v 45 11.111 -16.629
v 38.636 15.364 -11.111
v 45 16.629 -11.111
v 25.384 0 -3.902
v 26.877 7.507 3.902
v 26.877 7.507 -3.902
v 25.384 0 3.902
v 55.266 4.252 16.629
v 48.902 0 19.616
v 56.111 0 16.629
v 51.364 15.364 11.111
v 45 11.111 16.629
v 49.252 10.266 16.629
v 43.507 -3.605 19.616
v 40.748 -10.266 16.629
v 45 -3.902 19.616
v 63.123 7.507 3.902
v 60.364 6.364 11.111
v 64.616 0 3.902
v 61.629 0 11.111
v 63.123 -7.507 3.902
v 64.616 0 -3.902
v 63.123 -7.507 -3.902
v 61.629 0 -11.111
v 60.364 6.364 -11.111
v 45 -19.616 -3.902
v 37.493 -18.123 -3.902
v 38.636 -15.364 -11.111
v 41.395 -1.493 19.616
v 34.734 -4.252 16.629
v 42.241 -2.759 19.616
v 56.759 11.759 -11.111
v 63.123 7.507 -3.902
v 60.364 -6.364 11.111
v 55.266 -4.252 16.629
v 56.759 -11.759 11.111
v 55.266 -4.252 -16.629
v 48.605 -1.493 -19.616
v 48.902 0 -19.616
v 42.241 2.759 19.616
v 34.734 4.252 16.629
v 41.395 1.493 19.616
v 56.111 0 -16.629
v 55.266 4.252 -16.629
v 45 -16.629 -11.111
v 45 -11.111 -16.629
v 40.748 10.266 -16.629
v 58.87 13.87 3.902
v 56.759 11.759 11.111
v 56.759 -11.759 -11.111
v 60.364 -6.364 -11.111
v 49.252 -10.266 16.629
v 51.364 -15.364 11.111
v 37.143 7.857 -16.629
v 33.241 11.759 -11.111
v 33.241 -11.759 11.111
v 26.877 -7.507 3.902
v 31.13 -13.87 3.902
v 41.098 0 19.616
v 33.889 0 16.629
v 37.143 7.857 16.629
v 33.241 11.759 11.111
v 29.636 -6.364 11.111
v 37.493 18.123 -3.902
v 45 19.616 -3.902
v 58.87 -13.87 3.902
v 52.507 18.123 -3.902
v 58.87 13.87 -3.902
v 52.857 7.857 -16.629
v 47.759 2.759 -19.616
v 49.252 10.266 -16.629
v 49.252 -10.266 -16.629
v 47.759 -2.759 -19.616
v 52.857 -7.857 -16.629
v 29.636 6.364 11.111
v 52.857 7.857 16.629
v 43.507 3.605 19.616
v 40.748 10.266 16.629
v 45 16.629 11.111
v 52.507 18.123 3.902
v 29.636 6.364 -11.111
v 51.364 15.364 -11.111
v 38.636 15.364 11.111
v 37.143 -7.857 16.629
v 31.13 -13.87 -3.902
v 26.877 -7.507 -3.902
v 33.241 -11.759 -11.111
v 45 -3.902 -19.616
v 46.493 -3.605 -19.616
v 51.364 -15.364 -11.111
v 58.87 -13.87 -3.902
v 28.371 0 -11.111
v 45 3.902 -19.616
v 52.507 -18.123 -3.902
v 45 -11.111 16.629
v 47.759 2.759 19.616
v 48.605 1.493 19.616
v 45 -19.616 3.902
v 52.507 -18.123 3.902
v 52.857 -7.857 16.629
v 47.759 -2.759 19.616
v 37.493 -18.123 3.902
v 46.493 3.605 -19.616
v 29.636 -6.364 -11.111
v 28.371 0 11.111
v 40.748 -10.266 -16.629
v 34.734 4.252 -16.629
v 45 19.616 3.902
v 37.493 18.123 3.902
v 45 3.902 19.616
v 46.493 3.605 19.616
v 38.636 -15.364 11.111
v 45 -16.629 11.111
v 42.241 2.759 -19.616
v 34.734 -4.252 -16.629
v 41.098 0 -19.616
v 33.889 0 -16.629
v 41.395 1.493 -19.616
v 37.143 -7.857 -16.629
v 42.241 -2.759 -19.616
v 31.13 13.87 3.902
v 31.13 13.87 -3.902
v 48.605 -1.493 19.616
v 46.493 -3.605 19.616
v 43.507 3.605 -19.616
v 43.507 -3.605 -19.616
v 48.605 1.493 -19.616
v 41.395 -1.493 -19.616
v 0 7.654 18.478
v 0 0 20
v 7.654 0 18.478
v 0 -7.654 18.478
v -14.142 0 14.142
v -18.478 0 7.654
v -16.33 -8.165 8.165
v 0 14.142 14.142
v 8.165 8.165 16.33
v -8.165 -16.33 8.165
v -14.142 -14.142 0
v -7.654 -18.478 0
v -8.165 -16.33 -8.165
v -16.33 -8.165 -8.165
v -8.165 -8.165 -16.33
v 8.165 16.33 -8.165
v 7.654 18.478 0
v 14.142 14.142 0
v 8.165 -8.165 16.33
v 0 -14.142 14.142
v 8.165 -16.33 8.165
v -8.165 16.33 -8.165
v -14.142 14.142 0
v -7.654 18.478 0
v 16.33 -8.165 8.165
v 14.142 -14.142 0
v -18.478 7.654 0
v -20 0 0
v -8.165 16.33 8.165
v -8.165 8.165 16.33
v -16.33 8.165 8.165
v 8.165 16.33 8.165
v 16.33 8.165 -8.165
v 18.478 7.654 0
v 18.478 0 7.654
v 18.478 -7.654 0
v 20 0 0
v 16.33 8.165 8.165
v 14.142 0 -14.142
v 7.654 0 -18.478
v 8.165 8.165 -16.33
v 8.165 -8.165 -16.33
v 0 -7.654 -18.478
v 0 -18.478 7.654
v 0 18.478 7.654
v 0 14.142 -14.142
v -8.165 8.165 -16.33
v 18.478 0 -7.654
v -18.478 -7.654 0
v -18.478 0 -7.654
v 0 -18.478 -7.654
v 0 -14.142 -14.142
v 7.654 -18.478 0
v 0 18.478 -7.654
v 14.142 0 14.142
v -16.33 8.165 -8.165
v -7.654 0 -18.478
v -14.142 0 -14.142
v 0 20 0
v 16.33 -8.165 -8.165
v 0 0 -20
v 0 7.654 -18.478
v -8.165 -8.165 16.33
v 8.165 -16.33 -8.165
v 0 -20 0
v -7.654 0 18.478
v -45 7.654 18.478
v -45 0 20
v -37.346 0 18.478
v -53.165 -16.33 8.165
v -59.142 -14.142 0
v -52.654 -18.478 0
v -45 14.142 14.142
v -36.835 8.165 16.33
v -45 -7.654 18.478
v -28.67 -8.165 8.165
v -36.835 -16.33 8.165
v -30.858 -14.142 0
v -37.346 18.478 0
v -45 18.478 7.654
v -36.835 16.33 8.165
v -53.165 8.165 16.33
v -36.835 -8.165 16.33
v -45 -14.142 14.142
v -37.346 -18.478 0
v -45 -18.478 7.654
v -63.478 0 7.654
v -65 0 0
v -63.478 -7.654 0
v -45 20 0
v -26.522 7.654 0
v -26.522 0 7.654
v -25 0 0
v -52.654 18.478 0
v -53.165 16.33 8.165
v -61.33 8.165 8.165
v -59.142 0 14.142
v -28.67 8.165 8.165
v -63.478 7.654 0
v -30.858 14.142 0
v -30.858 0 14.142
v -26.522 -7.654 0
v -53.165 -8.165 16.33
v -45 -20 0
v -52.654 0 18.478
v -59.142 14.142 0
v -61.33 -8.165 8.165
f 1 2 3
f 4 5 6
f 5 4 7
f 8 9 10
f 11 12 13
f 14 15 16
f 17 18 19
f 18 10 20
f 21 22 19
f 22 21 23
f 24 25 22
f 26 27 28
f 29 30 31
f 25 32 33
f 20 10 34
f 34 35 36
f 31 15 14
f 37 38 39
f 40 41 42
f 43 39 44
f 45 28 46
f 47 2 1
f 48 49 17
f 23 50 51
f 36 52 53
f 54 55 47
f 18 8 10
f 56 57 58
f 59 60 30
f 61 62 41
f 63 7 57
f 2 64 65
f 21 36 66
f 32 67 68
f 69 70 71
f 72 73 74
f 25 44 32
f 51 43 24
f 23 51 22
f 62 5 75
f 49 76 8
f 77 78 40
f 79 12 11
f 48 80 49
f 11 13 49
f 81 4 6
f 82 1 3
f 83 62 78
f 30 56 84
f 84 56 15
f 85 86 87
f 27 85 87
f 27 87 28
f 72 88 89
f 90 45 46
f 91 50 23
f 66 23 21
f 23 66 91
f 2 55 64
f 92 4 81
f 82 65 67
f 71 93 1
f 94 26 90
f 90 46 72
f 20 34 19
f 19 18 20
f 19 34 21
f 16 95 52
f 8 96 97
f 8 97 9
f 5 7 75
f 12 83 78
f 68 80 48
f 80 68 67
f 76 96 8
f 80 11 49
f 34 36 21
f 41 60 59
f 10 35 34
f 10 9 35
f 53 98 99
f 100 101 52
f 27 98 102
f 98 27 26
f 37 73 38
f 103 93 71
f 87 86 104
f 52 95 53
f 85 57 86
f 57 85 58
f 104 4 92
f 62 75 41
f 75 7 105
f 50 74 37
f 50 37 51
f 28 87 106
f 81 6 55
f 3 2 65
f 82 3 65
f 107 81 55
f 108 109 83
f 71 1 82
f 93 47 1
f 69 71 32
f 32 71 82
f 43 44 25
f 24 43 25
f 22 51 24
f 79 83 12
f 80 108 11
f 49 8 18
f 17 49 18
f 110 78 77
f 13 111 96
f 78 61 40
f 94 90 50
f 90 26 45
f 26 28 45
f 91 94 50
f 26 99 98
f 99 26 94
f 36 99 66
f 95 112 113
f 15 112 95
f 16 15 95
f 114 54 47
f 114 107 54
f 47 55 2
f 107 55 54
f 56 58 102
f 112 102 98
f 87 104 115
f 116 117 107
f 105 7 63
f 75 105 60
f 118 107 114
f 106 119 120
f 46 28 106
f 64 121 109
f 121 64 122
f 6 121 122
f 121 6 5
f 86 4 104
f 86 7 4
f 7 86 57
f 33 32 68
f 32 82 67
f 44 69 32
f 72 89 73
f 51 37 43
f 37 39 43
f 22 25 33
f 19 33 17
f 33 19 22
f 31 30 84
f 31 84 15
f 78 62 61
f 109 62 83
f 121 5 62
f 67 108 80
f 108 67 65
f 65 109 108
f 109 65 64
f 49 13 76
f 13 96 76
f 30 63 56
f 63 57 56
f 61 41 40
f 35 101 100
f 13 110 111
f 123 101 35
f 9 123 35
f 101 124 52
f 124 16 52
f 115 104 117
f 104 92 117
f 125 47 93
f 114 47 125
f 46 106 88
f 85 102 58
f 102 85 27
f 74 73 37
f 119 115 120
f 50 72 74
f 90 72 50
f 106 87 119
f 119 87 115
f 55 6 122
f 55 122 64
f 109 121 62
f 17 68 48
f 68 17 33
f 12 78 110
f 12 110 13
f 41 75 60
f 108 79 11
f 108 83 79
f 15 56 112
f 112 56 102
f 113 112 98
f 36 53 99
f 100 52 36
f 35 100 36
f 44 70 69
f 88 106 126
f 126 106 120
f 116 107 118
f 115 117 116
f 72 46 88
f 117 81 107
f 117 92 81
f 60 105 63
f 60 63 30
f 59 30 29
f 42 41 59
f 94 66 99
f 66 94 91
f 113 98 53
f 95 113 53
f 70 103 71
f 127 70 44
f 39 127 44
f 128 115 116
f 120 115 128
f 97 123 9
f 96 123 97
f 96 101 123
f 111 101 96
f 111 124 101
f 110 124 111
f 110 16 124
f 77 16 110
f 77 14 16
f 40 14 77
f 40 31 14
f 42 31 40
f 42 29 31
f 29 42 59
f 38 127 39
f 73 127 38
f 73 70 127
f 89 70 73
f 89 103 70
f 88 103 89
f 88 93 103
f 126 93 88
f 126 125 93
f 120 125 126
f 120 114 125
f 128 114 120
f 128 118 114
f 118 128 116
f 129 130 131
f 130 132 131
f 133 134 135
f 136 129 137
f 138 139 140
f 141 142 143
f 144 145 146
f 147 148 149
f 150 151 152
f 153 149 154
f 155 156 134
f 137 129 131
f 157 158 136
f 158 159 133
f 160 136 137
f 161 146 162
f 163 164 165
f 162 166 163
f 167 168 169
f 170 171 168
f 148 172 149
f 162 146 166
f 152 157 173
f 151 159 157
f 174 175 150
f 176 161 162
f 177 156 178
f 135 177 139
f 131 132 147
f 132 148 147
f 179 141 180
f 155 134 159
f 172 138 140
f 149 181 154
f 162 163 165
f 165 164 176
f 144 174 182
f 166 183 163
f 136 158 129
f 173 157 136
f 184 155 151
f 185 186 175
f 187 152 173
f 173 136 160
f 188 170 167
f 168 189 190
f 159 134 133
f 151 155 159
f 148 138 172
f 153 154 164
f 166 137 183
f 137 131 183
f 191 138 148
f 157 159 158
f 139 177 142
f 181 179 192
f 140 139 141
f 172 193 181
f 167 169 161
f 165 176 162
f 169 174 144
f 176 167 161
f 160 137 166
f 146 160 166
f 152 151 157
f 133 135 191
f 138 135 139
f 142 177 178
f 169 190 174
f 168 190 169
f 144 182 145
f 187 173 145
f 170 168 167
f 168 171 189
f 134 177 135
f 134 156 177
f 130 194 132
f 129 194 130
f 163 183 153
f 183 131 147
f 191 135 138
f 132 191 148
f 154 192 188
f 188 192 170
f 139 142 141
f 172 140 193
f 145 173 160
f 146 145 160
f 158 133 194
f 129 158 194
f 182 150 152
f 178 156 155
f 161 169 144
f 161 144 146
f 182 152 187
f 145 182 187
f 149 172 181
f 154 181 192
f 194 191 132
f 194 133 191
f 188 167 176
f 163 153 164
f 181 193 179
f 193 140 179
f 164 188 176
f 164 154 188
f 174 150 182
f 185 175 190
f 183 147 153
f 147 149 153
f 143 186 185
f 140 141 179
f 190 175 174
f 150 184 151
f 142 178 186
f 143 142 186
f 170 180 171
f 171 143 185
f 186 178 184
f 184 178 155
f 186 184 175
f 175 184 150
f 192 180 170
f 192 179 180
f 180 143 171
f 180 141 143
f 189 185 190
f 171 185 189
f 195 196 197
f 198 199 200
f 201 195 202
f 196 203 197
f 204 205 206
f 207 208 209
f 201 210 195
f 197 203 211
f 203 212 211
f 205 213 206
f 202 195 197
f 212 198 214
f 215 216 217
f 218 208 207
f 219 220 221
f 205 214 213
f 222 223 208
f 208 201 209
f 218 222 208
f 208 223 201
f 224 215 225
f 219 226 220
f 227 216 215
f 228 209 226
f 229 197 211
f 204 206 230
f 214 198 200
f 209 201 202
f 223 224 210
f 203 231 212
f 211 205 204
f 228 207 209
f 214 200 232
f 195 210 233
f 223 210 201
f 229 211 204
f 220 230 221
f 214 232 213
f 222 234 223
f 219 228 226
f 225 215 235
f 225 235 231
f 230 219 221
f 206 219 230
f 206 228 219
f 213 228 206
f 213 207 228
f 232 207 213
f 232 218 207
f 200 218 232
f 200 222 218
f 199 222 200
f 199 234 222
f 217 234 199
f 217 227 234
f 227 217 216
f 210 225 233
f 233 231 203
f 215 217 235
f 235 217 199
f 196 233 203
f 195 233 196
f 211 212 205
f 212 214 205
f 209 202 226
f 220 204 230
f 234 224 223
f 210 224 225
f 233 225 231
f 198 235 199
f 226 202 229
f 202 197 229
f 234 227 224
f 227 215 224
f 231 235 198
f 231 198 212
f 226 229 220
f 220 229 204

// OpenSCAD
// file: ../octsphere.scad
//=== octsphere.scad ===
/**
 * @file octsphere.scad
 * @brief Geodesic sphere or hemisphere based on an octahedron with equatorial polygonal symmetry.
 *
 * This OpenSCAD module/function generates a geodesic sphere or hemisphere with flat equators 
 * aligned with the XY, YZ, and XZ planes. It uses an octahedron base to maintain regular polygon
 * equators, unlike icosahedron-based geodesic domes which lack flat symmetry at the equator.
 *
 * ## Usage
 * Add this file to your `.scad` project and use one of the following methods:
 *
 * Modular rendering (similar to built-in `sphere()`):
 * ```scad
 * octsphere(r=radius);              // or:
 * octsphere(d=diameter);
 * ```
 *
 * Functional call (returns polyhedron data):
 * ```scad
 * mesh = octsphere(r=radius);
 * polyhedron(points = mesh[0], faces = mesh[1]);
 * ```
 *
 * Optional parameters:
 * - `r` / `d`  : radius or diameter (default = 1)
 * - `hemisphere` : true to generate a hemisphere (default = false)
 *
 * The `$fn`, `$fa`, and `$fs` special variables control polygon resolution. The number of equator sides
 * will snap to the nearest of the form 4×2ⁿ (e.g., 4, 8, 16, 32, 64, 128).
 *
 * ## Background
 * Octahedron-based geodesic spheres offer equators that lie in all three principal planes, which can 
 * better interface with other regular polygon geometry. This structure enables easier alignment with 
 * cylinders, prisms, and other modular shapes in parametric designs.
 *
 * For more hemisphere flexibility, see: [Geodesic Hemisphere](https://www.printables.com/model/129119)
 *
 * ## References and Acknowledgements
 * - Octsphere by Amatulic, CC0 (public domain): https://www.thingiverse.com/thing:6481347
 *   and https://www.printables.com/model/762498
 * - Geodesic Sphere by Jamie Kawabata (Jamie_K), CC0, which it builds on:
 *   https://www.thingiverse.com/thing:1484333
 * - Geodesic Hemisphere: https://www.printables.com/model/129119
 *
 * Changes in this copy (Cameron Brooks): resolution falls back on $fa and $fs
 * when $fn isn't set; the demo moved to examples/compare.scad.
 */

//=== Module: octahedral sphere or hemisphere ===

/**
 * @module octsphere
 * @brief Renders a geodesic octahedral sphere or hemisphere as a polyhedron.
 * @param r Radius of the sphere (default = -1; must be > 0 if used)
 * @param d Diameter of the sphere (default = -1; must be > 0 if used)
 * @param hemisphere If true, generates only the upper hemisphere
 */
module octsphere(r = -1, d = -1, hemisphere = false) {
    mesh = octsphere(r, d, hemisphere);
    polyhedron(points=mesh[0], faces=mesh[1]);
}

//=== Function: octahedral geodesic sphere or hemisphere ===

/**
 * @function octsphere
 * @brief Returns a [vertices, faces] array representing an octahedral geodesic polyhedron.
 * @param r Radius (preferred, optional)
 * @param d Diameter (alternative to r, optional)
 * @param hemisphere Generate only upper hemisphere if true
 * @return Array: [vertex list, face list]
 */
function octsphere(r = -1, d = -1, hemisphere = false) =
    let (
        rad = r > 0 ? r : d > 0 ? d / 2 : 1, // Default radius = 1
        // Equator sides: $fn if set, otherwise $fa and $fs, by the rule
        // OpenSCAD's own sphere() uses; at least 4, the octahedron's equator.
        fn = max(4, $fn > 0 ? $fn : ceil(max(min(360 / $fa, rad * 2 * PI / $fs), 5))),
        log2 = log(2.0),
        pn = (log(fn) - log(4)) / log2,
        dpn = [abs(4 * 2 ^ floor(pn) - fn), abs(4 * 2 ^ ceil(pn) - fn)],
        levels = floor(pn) + (argmin(dpn) % 2),
        nlv = 4 * 2 ^ levels,
        octahedron = [
            [
                [0, 0, 1],
                [0, 1, 0],
                [0, -1, 0],
                [1, 0, 0],
                [-1, 0, 0],
                if (!hemisphere) [0, 0, -1],
            ],
            hemisphere ? [[0, 1, 3], [0, 3, 2], [0, 2, 4], [0, 4, 1]]
            : [
                [0, 1, 3],
                [0, 3, 2],
                [0, 2, 4],
                [0, 4, 1],
                [5, 3, 1],
                [5, 2, 3],
                [5, 4, 2],
                [5, 1, 4],
            ],
        ],
        subdivided = multi_subdiv_pf(octahedron, levels),
        vertices = hemisphere ? concat(
                subdivided[0], [
                    for (n = [0:nlv]) let (t = n * 360 / nlv) [cos(t), sin(t), 0],
                ]
            )
        : subdivided[0],
        faces = hemisphere ? let (pstart = len(vertices) - nlv) concat(subdivided[1], [[for (n = [0:nlv - 1]) pstart + n]])
        : subdivided[1]
    ) [rad * vertices, faces];

//=== Support Functions ===

/**
 * @function argmin
 * @brief Return index of minimum value in a list.
 * @param v Array of values
 * @return Integer index of smallest value
 */
function argmin(v, k = 0, mem = [-1, ceil(1 / 0)]) =
    (k == len(v)) ? mem[0]
    : v[k] < mem[1] ? argmin(v, k + 1, [k, v[k]])
    : argmin(v, k + 1, mem);

/**
 * @function midpt
 * @brief Compute unit-length midpoint of two 3D points on a sphere.
 * @param p1 First 3D point
 * @param p2 Second 3D point
 * @return Midpoint vector normalized to length 1
 */
function midpt(p1, p2) =
    let (mid = 0.5 * (p1 + p2)) mid / norm(mid);

/**
 * @function subdivpf
 * @brief Subdivide each triangle face into 4 smaller triangles on a unit sphere.
 * @param pf Array of [points, faces]
 * @return Subdivided [points, faces]
 */
function subdivpf(pf) =
    let (p = pf[0], faces = pf[1]) [
            [
                // new points
                for (f = faces) let (p0 = p[f[0]], p1 = p[f[1]], p2 = p[f[2]]) each [p0, p1, p2, midpt(p0, p1), midpt(p1, p2), midpt(p0, p2)],
            ],
            [
                // new faces
                for (i = [0:len(faces) - 1]) let (base = 6 * i) each [
                    [base, base + 3, base + 5],
                    [base + 3, base + 1, base + 4],
                    [base + 5, base + 4, base + 2],
                    [base + 3, base + 4, base + 5],
                ],
            ],
    ];

/**
 * @function multi_subdiv_pf
 * @brief Recursively subdivide a polyhedron into finer faces.
 * @param pf Array of [points, faces]
 * @param levels Number of recursive subdivision levels
 * @return Refined [points, faces]
 */
function multi_subdiv_pf(pf, levels) =
    (levels == 0) ? pf
    : multi_subdiv_pf(subdivpf(pf), levels - 1);
// main file
// A hemisphere, an octsphere and OpenSCAD's sphere(), side by side at one resolution.
// Left to right: octsphere(hemisphere = true), octsphere(), sphere().

use <../octsphere.scad>;

// Sides around each equator; octsphere snaps to 4, 8, 16, 32, 64 or 128
sides = 16; // [4, 8, 16, 32, 64, 128]

$fn = sides;

translate([45, 0, 0]) color("pink") sphere(20);
color("lightgreen") octsphere(20);
translate([-45, 0, 0]) color("lightblue") octsphere(20, hemisphere=true);
